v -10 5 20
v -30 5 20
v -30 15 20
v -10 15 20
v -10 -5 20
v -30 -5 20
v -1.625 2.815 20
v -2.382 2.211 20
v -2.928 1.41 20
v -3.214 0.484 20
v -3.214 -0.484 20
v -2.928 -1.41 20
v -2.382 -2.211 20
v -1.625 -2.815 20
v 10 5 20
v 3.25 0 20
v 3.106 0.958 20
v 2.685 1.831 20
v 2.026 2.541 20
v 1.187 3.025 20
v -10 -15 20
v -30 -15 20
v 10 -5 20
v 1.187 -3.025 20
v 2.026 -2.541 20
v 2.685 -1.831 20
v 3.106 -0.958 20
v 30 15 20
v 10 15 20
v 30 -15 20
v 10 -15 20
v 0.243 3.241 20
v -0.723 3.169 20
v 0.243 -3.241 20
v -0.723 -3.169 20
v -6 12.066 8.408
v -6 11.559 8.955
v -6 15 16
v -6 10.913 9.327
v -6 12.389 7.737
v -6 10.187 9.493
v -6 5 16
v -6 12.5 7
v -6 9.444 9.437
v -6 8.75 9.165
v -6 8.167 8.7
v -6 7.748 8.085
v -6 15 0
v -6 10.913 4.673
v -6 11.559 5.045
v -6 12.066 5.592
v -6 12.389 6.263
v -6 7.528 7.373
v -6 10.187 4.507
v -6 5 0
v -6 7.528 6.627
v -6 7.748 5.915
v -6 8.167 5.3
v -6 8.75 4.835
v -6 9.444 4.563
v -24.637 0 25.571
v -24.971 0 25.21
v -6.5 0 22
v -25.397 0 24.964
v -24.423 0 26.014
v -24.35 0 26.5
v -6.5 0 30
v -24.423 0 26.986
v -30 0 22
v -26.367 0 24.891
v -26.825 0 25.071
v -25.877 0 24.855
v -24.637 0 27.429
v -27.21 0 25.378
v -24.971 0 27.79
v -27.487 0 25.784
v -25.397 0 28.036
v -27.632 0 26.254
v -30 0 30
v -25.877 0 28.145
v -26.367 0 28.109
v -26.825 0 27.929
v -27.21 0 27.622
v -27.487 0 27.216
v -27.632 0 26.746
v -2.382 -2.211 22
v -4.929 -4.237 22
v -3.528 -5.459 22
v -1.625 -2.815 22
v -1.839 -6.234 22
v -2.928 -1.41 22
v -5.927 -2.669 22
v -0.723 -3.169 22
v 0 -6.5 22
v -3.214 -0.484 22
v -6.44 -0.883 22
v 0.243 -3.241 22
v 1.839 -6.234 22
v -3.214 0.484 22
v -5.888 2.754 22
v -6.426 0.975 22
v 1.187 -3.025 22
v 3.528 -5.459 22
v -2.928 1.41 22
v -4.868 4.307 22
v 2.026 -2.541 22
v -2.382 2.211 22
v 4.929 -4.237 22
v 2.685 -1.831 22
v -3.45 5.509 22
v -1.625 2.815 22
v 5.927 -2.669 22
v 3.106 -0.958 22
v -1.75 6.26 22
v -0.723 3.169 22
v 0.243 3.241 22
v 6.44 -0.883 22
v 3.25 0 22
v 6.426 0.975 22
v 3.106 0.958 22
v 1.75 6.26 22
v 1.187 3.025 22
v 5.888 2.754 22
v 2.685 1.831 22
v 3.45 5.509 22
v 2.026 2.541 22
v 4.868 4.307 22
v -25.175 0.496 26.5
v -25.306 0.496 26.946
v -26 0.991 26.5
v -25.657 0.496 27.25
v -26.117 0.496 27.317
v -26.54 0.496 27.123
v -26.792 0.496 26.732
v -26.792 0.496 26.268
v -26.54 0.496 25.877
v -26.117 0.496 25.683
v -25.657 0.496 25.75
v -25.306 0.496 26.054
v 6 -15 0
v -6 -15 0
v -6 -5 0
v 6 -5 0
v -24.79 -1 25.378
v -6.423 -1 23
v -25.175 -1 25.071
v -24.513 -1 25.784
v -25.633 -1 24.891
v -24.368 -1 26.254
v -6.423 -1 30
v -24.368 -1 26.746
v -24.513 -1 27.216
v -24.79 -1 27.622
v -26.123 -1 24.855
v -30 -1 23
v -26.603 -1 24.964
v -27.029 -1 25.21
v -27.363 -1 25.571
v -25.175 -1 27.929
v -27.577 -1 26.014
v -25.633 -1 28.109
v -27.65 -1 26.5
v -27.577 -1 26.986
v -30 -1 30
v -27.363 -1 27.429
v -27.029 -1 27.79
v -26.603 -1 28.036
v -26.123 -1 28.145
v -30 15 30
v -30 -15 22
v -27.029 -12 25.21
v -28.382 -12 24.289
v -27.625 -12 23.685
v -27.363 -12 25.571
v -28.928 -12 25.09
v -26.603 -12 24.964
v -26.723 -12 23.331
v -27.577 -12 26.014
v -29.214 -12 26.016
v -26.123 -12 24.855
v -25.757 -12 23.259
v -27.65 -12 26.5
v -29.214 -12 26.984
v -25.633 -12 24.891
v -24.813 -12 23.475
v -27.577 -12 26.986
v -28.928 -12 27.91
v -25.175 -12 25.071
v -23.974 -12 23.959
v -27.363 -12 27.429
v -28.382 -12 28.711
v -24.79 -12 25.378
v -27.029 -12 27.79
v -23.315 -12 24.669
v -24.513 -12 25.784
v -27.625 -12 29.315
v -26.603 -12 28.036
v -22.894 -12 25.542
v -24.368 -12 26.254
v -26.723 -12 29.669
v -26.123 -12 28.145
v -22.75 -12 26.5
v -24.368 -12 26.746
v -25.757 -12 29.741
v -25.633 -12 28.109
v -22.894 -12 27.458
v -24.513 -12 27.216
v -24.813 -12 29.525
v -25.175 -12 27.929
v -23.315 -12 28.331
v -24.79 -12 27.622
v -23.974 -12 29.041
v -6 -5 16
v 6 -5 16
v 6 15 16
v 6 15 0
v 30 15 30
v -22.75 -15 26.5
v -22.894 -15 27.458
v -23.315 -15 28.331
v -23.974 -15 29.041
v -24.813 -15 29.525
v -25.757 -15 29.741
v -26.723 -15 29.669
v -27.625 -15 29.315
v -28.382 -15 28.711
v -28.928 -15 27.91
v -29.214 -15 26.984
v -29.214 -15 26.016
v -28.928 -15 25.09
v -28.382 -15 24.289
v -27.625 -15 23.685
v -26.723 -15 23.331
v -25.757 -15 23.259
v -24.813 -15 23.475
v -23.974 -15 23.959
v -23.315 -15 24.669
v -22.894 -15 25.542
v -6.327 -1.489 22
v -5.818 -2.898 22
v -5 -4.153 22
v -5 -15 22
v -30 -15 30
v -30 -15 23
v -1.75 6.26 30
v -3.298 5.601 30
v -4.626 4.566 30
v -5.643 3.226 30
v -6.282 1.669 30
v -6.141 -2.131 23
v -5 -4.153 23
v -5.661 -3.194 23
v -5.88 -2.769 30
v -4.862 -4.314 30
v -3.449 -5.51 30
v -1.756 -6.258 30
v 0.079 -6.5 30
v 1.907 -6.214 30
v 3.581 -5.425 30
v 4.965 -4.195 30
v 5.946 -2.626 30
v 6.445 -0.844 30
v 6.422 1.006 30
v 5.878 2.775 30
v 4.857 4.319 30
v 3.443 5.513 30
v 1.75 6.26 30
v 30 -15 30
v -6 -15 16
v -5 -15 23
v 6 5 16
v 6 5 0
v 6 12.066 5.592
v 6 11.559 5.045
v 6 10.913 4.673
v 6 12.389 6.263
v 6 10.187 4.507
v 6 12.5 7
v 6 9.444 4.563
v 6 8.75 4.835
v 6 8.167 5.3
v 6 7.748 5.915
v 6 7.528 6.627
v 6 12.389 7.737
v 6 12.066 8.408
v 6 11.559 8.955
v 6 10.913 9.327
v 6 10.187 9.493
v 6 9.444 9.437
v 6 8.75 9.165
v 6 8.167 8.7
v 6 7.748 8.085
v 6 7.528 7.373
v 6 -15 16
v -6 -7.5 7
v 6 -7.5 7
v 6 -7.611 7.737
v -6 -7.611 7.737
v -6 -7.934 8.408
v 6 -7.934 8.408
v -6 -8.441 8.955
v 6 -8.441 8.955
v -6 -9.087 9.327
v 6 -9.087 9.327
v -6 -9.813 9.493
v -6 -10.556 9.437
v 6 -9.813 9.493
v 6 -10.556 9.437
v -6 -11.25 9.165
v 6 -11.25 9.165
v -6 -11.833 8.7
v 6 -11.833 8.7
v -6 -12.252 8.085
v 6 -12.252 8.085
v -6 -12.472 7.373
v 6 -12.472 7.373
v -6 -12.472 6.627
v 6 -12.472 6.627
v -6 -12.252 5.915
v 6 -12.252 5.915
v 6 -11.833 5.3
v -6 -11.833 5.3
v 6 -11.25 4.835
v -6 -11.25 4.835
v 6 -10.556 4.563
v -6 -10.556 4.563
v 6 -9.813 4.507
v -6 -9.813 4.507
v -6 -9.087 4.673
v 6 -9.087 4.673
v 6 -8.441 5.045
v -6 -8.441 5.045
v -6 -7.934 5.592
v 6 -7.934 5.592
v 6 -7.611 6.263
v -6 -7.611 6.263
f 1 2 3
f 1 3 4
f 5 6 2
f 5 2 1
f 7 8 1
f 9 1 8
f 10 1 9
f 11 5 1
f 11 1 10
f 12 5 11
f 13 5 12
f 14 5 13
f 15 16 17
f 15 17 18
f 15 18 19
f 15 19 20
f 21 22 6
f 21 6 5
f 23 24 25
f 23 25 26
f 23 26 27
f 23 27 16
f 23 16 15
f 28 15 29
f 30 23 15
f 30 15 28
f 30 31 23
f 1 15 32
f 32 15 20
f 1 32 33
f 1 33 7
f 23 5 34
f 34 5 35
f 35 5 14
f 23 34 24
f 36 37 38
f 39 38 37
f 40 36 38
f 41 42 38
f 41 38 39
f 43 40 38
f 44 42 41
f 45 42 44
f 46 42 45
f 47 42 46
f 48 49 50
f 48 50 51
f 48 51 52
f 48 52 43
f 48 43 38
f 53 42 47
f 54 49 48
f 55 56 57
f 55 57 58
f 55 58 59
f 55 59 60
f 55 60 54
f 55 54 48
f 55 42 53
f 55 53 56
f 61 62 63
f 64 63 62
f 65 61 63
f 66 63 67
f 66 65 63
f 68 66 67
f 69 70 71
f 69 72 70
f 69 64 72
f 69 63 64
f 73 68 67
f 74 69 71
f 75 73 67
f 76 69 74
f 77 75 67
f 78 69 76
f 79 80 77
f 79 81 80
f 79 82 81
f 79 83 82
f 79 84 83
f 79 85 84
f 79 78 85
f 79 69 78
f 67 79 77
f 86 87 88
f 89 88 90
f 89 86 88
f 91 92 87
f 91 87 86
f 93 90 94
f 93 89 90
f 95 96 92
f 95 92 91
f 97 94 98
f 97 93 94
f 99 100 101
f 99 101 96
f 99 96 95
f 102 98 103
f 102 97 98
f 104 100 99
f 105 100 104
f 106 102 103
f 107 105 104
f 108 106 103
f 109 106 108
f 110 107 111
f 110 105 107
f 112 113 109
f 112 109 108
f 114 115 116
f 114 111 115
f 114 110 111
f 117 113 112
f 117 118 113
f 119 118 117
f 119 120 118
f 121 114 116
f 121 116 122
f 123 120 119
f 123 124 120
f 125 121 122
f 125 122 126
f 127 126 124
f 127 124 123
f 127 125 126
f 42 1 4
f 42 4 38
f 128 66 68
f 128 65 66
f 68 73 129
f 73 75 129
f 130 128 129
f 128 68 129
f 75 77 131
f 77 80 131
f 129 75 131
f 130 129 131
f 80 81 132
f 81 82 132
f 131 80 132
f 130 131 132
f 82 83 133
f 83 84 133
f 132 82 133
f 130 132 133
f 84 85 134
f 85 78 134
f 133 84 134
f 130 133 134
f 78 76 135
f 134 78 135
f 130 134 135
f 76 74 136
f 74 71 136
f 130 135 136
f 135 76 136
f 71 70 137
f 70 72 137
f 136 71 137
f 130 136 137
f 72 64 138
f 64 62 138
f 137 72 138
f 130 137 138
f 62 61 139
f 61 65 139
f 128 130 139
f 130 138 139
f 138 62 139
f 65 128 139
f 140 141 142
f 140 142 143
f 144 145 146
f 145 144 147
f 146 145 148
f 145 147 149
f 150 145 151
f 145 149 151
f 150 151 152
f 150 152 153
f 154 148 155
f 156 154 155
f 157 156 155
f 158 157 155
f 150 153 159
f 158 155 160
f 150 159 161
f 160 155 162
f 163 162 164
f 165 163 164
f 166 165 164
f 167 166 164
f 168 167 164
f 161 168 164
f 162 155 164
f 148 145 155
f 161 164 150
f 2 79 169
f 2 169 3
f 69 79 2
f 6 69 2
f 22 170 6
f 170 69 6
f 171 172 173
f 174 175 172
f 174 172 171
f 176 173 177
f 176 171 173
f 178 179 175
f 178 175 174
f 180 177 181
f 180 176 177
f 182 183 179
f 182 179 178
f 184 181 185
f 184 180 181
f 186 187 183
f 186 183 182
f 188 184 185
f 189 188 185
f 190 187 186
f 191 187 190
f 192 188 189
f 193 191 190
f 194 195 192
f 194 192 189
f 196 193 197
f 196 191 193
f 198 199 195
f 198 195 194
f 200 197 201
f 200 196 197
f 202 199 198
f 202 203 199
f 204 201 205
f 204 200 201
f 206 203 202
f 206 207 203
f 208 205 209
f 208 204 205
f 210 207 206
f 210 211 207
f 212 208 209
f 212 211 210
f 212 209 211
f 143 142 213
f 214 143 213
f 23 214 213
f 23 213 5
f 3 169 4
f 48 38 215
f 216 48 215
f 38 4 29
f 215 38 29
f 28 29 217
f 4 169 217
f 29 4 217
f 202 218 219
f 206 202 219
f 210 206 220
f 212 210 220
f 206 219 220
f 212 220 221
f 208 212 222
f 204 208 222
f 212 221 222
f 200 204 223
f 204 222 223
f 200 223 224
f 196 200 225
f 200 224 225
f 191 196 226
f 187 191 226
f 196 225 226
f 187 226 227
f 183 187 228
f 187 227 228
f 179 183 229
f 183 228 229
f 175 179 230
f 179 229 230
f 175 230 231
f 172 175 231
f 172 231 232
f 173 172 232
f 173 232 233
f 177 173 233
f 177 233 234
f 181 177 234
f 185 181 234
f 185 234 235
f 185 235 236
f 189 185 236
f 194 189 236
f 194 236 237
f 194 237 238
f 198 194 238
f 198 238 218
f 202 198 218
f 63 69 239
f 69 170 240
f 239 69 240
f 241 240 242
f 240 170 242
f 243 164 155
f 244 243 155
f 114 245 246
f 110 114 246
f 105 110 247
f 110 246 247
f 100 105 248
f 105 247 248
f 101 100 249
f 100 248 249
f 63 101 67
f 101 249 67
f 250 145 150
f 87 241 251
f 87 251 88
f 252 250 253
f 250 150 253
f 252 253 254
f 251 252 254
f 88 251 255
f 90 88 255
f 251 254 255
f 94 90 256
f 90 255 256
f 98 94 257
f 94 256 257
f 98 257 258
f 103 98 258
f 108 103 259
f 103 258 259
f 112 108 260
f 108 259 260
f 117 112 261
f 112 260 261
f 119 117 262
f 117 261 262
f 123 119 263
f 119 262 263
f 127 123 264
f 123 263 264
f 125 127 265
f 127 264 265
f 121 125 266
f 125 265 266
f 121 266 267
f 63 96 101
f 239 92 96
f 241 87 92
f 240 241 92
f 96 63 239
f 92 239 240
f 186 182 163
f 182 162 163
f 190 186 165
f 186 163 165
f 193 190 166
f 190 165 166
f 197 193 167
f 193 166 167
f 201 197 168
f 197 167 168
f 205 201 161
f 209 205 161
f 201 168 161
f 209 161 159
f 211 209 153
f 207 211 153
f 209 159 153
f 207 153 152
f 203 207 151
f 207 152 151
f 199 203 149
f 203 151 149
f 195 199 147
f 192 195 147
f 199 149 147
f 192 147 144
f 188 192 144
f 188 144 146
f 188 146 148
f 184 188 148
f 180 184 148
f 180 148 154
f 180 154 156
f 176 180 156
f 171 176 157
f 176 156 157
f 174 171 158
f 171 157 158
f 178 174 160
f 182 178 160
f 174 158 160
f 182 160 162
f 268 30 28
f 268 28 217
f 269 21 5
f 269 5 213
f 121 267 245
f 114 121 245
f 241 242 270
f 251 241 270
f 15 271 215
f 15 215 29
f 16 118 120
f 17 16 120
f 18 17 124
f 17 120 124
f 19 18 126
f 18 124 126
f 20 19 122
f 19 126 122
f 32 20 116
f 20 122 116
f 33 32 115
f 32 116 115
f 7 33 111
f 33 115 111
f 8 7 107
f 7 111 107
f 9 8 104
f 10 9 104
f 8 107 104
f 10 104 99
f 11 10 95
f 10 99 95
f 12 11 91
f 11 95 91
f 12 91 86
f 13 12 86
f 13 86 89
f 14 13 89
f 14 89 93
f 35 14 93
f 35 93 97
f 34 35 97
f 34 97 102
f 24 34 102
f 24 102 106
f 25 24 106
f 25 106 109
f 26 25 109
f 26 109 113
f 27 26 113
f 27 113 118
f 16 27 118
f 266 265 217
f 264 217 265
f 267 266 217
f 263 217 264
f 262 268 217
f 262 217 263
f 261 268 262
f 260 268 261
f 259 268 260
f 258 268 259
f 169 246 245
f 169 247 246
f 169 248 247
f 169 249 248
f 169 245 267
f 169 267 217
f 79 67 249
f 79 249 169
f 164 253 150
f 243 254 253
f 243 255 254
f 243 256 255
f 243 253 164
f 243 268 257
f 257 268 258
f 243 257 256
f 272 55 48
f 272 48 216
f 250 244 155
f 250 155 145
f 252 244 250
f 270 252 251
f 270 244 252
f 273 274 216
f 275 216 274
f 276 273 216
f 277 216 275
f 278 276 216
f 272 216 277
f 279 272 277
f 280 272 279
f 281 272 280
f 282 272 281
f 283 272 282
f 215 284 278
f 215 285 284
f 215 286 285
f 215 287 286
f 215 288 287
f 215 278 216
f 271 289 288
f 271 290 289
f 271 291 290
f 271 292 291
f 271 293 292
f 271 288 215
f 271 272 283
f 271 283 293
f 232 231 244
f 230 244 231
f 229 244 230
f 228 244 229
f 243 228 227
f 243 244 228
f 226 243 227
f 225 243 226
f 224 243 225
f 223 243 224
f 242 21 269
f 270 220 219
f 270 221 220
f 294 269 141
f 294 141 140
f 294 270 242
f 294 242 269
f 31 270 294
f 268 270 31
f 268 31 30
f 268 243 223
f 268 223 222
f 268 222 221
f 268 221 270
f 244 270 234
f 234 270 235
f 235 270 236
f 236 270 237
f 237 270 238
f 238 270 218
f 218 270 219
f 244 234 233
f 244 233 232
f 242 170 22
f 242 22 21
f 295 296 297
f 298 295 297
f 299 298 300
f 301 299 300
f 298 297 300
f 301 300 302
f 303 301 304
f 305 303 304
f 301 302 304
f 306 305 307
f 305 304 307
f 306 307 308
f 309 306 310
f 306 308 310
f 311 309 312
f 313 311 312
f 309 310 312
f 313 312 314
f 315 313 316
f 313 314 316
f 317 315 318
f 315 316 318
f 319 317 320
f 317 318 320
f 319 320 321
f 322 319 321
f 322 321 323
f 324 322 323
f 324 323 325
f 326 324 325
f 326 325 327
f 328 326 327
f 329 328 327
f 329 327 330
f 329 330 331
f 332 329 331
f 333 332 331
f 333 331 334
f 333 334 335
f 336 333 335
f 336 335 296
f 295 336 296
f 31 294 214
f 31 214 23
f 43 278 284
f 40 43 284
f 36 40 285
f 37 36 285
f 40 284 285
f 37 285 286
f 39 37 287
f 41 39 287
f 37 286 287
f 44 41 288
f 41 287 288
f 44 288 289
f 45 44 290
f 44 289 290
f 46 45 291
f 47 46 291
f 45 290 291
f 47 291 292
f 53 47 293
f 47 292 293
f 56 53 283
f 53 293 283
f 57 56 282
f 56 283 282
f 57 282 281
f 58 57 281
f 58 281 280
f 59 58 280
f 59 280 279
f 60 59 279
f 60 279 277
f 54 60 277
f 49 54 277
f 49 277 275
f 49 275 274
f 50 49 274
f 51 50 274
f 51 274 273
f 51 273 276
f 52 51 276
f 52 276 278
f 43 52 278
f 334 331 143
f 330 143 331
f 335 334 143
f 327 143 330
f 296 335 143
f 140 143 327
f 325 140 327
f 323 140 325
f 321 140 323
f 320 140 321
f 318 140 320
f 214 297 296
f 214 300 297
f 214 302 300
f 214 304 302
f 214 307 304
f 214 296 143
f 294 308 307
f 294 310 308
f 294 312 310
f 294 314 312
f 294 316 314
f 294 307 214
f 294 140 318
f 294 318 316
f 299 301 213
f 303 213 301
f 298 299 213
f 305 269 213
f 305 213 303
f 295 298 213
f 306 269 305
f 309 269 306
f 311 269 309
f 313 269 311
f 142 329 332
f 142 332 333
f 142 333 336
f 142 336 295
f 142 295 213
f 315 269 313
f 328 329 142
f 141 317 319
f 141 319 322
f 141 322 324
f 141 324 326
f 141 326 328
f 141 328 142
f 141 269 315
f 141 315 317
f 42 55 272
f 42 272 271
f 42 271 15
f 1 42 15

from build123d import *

# Parameters (mm, degrees)
F1_DEPTH        = 15
F3_DEPTH        = 8
F4_R            = 3.25
F5_DEPTH        = 22.001
F6_W            = 10
F6_H            = 20.0000007821
F7_DEPTH        = 60.001
F8_W            = 25
F8_H            = 1
F9_DEPTH        = 15
F10_W           = 1
F10_H           = 6.9999992179
F11_DEPTH       = 25
F13_D           = 3.3
F13_DEPTH       = 15
F13_CBORE_D     = 6.5
F13_CBORE_DEPTH = 3
F13_TIP         = 0.9914200214
F15_D           = 5


with BuildPart() as f1:
    # F0 (on Front) → F1 (new body, symmetric)
    with BuildSketch(Plane.XZ):
        Polygon((-6, 16.0000007821), (-6, 0), (0, 0), (0, 30), (-30, 30), (-30, 20.0000007821), (-10, 20.0000007821), align=None)
        Polygon((0, 30), (0, 0), (6, 0), (6, 16.0000007821), (10, 20.0000007821), (30, 20.0000007821), (30, 30), align=None)
    extrude(amount=F1_DEPTH, both=True)

    # F2 (on face) → F3 (cut)
    with BuildSketch(Plane.XY.offset(30)):
        with BuildLine():
            Line((1.75, 6.2599920128), (-1.75, 6.2599920128))
            ThreePointArc((-1.75, 6.2599920128), (0, -6.5), (1.75, 6.2599920128))
        make_face()
    extrude(amount=-F3_DEPTH, mode=Mode.SUBTRACT)

    # F4 (on face) → F5 (cut, through all)
    with BuildSketch(Plane.XY.offset(22)):
        Circle(F4_R)
    extrude(amount=-F5_DEPTH, mode=Mode.SUBTRACT)

    # F6 (on face) → F7 (cut, through all)
    with BuildSketch(Plane(origin=(-30, 0, 0), x_dir=(0, -1, 0), z_dir=(-1, 0, 0))):
        with Locations((0, 10.0000003911)):
            Rectangle(F6_W, F6_H)
    extrude(amount=-F7_DEPTH, mode=Mode.SUBTRACT)

    # F8 (on face) → F9 (cut)
    with BuildSketch(Plane.XZ.offset(15)):
        with Locations((-17.5, 22.5000007821)):
            Rectangle(F8_W, F8_H)
    extrude(amount=-F9_DEPTH, mode=Mode.SUBTRACT)

    # F10 (on face) → F11 (cut)
    with BuildSketch(Plane(origin=(-30, 0, 0), x_dir=(0, -1, 0), z_dir=(-1, 0, 0))):
        with Locations((0.5, 26.5000003911)):
            Rectangle(F10_W, F10_H)
    extrude(amount=-F11_DEPTH, mode=Mode.SUBTRACT)

    # F13
    with Locations(Plane.XZ.offset(15)):
        with Locations((-26, 26.5)):
            CounterBoreHole(F13_D / 2, F13_CBORE_D / 2, F13_CBORE_DEPTH, depth=F13_DEPTH)
            with Locations((0, 0, -(F13_DEPTH + F13_TIP / 2))):  # 118° drill point
                Cone(0, F13_D / 2, F13_TIP, mode=Mode.SUBTRACT)

    # F15 (through all)
    with Locations(Plane(origin=(-6, 0, 0), x_dir=(0, -1, 0), z_dir=(-1, 0, 0))):
        with Locations((-10, 7), (10, 7)):
            Hole(F15_D / 2)


solid = f1.part
